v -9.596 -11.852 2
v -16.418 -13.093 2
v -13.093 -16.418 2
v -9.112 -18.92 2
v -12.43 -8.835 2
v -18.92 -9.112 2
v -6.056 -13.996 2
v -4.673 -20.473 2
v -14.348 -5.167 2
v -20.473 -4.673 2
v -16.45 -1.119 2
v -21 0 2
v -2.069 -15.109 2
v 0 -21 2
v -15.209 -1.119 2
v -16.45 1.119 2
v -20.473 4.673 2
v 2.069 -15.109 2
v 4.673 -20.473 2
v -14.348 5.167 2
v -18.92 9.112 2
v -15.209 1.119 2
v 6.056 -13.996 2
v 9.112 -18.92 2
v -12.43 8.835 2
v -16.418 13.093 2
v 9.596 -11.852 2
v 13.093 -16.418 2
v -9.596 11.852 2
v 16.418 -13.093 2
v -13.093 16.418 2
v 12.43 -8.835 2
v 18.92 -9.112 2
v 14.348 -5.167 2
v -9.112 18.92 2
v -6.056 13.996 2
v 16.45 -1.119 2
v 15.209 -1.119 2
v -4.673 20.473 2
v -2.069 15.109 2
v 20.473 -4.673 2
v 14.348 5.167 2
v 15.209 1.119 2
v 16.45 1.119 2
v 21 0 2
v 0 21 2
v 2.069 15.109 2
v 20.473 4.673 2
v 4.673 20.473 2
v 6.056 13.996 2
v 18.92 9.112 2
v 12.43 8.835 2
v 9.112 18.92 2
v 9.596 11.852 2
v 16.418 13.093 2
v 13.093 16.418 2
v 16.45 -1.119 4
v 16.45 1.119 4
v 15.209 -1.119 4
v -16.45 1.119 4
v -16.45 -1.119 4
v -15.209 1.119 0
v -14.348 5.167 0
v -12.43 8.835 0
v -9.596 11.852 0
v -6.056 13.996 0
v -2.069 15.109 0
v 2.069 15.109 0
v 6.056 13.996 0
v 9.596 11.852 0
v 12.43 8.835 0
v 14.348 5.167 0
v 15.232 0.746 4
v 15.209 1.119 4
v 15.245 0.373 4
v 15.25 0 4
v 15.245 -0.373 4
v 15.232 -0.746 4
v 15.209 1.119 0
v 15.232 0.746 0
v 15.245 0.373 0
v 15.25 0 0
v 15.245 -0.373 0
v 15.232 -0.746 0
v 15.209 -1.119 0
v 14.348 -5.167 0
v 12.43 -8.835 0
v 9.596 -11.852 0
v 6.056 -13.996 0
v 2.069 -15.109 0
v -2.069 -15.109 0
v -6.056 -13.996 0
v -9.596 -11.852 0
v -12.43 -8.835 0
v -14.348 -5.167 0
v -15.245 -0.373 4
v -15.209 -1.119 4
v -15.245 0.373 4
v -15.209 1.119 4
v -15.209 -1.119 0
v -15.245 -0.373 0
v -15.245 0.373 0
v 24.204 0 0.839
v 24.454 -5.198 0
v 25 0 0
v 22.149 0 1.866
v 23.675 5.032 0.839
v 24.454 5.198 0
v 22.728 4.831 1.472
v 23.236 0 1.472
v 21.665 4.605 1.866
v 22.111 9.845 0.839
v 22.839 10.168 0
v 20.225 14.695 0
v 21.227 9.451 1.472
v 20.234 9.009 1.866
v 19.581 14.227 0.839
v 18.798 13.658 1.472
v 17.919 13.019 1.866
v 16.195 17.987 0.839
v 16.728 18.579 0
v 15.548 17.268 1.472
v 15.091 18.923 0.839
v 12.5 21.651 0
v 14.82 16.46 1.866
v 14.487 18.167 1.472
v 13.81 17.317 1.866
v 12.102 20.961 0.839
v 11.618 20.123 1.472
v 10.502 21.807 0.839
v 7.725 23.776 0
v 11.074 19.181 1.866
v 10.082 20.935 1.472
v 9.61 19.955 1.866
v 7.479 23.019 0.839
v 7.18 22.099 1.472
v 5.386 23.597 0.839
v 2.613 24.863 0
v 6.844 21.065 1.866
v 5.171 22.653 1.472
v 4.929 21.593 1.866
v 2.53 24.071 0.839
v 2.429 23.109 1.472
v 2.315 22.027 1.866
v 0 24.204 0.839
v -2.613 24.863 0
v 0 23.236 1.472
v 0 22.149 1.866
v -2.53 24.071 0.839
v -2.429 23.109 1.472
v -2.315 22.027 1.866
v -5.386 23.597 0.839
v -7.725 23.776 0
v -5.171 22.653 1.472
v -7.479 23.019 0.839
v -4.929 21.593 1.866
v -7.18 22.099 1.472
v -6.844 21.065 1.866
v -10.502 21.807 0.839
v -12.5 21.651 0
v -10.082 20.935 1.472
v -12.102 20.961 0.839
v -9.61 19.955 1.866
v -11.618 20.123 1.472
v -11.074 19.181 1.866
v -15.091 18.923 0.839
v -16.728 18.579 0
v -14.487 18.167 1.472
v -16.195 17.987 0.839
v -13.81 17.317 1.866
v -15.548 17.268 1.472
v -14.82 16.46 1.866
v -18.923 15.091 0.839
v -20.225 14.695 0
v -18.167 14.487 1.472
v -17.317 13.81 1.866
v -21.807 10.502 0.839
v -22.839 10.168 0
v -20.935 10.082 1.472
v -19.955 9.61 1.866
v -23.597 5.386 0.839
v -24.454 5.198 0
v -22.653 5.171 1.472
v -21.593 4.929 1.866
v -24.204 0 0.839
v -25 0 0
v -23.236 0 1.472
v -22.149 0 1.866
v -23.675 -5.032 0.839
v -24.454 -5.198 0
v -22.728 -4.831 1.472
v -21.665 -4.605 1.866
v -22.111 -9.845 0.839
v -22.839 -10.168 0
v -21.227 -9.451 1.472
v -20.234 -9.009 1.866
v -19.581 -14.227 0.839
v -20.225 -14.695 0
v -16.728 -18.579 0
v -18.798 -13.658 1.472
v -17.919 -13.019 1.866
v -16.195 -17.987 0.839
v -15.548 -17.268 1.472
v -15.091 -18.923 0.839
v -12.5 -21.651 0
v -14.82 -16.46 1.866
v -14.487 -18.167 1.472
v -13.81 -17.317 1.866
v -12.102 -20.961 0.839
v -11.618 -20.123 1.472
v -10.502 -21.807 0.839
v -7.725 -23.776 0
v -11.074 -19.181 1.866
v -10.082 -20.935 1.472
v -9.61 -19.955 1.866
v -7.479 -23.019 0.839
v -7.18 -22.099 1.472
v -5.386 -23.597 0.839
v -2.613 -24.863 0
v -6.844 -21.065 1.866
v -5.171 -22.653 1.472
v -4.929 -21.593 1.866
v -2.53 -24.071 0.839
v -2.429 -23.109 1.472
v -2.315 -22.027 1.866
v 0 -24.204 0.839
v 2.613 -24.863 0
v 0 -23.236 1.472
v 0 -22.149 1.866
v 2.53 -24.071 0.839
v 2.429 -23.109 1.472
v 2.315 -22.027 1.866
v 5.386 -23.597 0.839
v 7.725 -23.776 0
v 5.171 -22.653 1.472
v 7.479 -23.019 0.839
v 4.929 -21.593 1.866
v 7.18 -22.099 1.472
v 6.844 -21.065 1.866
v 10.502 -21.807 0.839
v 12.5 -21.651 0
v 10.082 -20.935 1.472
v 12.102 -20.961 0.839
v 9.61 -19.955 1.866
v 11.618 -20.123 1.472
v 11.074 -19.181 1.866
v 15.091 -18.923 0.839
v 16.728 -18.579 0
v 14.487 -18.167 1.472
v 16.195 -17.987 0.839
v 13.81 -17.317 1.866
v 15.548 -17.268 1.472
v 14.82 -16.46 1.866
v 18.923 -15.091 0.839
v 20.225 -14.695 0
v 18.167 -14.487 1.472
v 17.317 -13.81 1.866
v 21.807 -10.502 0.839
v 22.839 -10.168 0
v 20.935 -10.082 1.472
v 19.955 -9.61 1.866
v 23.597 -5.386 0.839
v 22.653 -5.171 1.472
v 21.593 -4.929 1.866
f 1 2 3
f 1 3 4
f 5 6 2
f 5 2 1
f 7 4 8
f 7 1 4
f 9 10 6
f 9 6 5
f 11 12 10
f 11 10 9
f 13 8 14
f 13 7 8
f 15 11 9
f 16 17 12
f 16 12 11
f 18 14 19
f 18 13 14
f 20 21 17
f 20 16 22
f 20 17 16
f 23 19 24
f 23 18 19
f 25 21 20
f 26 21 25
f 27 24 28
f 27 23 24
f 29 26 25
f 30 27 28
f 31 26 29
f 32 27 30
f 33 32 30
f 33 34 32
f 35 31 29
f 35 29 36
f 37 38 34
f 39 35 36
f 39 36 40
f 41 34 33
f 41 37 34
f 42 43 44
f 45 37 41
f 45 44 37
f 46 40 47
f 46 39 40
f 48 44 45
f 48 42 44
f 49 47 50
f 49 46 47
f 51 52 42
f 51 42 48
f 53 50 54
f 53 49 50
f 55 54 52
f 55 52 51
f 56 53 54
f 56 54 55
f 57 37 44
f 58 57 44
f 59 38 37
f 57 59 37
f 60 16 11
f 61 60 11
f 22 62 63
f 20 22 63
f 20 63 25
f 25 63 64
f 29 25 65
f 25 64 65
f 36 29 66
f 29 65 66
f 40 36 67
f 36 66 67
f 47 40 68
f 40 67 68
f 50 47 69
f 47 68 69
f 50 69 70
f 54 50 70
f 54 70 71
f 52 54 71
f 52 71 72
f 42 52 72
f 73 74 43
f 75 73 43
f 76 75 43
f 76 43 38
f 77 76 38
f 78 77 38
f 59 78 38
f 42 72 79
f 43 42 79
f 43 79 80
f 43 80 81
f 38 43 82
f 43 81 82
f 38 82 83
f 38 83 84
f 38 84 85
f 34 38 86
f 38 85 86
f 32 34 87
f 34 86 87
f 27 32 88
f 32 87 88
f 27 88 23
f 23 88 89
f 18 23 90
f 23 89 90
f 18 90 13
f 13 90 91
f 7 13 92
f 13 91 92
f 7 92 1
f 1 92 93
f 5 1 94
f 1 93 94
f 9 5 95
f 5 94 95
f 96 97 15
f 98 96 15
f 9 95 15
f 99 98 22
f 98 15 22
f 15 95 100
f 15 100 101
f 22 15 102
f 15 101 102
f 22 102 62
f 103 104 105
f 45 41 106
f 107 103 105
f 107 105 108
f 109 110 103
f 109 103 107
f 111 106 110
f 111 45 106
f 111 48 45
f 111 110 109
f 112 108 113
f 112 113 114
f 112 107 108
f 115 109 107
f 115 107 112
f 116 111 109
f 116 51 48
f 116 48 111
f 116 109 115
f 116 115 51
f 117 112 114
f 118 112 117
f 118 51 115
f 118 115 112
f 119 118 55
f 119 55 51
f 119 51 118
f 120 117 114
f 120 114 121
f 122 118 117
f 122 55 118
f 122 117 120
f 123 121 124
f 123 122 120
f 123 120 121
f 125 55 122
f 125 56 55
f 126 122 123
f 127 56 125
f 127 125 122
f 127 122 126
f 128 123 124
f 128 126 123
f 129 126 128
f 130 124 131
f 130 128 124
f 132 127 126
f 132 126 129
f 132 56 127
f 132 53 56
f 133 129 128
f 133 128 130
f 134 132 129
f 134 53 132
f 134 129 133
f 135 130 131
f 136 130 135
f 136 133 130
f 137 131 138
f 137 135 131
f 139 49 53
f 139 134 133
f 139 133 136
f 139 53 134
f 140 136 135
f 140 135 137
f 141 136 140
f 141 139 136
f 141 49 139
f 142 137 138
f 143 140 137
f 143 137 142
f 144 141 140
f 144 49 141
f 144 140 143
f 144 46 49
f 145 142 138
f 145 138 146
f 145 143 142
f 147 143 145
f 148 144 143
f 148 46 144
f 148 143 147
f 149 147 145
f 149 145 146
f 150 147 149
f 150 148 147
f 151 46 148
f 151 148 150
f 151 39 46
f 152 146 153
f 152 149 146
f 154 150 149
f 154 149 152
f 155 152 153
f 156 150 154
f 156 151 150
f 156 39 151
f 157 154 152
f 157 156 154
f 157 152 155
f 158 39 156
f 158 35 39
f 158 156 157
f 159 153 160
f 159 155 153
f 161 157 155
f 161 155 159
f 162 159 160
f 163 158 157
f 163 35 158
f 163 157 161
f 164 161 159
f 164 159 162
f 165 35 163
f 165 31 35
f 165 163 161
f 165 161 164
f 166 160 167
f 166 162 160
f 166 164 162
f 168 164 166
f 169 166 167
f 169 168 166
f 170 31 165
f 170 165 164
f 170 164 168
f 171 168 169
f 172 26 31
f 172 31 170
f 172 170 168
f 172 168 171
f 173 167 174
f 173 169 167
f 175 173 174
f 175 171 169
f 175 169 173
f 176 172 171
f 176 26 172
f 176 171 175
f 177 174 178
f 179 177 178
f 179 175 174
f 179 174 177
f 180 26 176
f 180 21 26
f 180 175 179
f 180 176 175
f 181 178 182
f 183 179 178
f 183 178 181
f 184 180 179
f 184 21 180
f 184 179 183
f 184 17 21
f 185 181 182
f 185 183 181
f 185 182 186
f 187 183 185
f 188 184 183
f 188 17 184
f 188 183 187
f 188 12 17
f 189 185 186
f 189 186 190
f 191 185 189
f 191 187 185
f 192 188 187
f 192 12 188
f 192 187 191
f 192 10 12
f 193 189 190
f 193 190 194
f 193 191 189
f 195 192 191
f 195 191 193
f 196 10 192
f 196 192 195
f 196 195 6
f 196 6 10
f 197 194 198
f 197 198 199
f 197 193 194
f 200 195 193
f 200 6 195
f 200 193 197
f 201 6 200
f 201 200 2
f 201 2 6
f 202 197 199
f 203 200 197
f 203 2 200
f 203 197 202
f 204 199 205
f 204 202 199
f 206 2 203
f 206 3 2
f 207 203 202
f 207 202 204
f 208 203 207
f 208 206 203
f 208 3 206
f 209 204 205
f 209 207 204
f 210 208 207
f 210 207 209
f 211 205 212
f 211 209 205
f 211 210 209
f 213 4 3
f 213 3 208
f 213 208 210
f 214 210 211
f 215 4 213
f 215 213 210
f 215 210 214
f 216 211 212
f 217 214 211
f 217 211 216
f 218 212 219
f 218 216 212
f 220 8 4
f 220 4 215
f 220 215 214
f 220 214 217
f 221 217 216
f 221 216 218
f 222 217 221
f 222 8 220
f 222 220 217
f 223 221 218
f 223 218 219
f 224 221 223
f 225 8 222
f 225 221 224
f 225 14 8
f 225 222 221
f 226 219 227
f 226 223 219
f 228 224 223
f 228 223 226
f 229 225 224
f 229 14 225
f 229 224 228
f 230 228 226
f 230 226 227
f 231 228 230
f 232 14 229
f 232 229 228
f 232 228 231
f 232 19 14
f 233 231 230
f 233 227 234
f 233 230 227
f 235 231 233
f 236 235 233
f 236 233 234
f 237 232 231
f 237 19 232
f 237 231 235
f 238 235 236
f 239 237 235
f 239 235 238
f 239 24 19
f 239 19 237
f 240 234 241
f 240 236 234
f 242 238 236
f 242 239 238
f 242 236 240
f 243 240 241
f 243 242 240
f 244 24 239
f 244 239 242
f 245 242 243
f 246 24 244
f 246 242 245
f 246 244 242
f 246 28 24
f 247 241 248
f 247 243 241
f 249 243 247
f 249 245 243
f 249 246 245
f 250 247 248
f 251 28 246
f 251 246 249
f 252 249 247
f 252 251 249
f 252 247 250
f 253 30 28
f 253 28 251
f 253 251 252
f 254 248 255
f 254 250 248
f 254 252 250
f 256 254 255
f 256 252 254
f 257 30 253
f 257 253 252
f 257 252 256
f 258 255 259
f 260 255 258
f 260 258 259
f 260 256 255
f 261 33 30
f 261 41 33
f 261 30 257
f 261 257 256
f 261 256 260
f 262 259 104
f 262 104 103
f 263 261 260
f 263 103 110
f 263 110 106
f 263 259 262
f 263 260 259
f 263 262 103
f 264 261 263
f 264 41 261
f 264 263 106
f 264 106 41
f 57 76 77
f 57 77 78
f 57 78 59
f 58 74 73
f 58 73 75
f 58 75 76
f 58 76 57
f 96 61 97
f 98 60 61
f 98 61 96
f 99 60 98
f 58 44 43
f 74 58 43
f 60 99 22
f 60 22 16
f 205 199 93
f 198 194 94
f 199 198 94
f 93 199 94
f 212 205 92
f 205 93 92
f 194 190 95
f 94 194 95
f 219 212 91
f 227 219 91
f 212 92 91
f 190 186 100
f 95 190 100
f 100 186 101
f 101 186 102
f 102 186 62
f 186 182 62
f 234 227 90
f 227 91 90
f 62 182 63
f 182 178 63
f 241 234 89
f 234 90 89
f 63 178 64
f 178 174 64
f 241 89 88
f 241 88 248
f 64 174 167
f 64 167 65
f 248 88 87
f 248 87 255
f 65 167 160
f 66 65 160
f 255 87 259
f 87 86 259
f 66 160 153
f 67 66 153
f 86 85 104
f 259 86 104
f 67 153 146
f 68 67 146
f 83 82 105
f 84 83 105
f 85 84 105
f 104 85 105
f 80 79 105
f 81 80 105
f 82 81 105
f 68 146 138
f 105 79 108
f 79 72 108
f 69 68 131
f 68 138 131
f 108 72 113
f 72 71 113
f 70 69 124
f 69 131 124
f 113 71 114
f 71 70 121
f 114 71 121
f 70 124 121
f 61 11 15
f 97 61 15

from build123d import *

# Parameters (mm, degrees)
F0_R     = 25
F1_DEPTH = 2
F3_DEPTH = 4


# Not quite as in the source:
# - a fillet or chamfer that OpenCascade refuses, or shapes differently, is made with other operations: its cross-section is extruded or revolved along the edge and cut away or added


with BuildPart() as f1:
    # F0 (on Top) → F1 (new body)
    with BuildSketch(Plane.XY):
        Circle(F0_R)
        with BuildLine():
            ThreePointArc((-15.2089073237, 1.1187662932), (0, 15.25), (15.2089073237, 1.1187662932))
            Line((15.2089073237, 1.1187662932), (16.45, 1.1187662932))
            Line((16.45, 1.1187662932), (16.45, -1.1187662932))
            Line((16.45, -1.1187662932), (15.2089073237, -1.1187662932))
            ThreePointArc((15.2089073237, -1.1187662932), (0, -15.25), (-15.2089073237, -1.1187662932))
            Line((-15.2089073237, -1.1187662932), (-16.45, -1.1187662932))
            Line((-16.45, -1.1187662932), (-16.45, 1.1187662932))
            Line((-16.45, 1.1187662932), (-15.2089073237, 1.1187662932))
        make_face(mode=Mode.SUBTRACT)
        with BuildLine():
            ThreePointArc((15.2089073237, 1.1187662932), (15.2397233683, 0.5597603565), (15.25, 0))
            ThreePointArc((15.25, 0), (15.2397233683, -0.5597603565), (15.2089073237, -1.1187662932))
            Line((15.2089073237, -1.1187662932), (16.45, -1.1187662932))
            Line((16.45, -1.1187662932), (16.45, 1.1187662932))
            Line((16.45, 1.1187662932), (15.2089073237, 1.1187662932))
        make_face()
        with BuildLine():
            ThreePointArc((-15.2089073237, -1.1187662932), (-15.25, 0), (-15.2089073237, 1.1187662932))
            Line((-15.2089073237, 1.1187662932), (-16.45, 1.1187662932))
            Line((-16.45, 1.1187662932), (-16.45, -1.1187662932))
            Line((-16.45, -1.1187662932), (-15.2089073237, -1.1187662932))
        make_face()
    extrude(amount=F1_DEPTH)

    # F2: fillet of radius 5 on 1 edges, made by hand

    # F2_s1 → F2_t2 (revolve, cut)
    with BuildSketch(Plane.XZ):
        with BuildLine():
            ThreePointArc((25, 0), (23.2360679775, 1.472135955), (21, 2))
            Line((21, 2), (25, 2))
            Line((25, 2), (25, 0))
        make_face()
    revolve(axis=Axis((0, 0, 2), (0, 0, 1)), mode=Mode.SUBTRACT)

    # F0 (on Top) → F3 (join)
    with BuildSketch(Plane.XY):
        with BuildLine():
            ThreePointArc((15.2089073237, 1.1187662932), (15.2397233683, 0.5597603565), (15.25, 0))
            ThreePointArc((15.25, 0), (15.2397233683, -0.5597603565), (15.2089073237, -1.1187662932))
            Line((15.2089073237, -1.1187662932), (16.45, -1.1187662932))
            Line((16.45, -1.1187662932), (16.45, 1.1187662932))
            Line((16.45, 1.1187662932), (15.2089073237, 1.1187662932))
        make_face()
        with BuildLine():
            ThreePointArc((-15.2089073237, -1.1187662932), (-15.25, 0), (-15.2089073237, 1.1187662932))
            Line((-15.2089073237, 1.1187662932), (-16.45, 1.1187662932))
            Line((-16.45, 1.1187662932), (-16.45, -1.1187662932))
            Line((-16.45, -1.1187662932), (-15.2089073237, -1.1187662932))
        make_face()
    extrude(amount=F3_DEPTH)


solid = f1.part
